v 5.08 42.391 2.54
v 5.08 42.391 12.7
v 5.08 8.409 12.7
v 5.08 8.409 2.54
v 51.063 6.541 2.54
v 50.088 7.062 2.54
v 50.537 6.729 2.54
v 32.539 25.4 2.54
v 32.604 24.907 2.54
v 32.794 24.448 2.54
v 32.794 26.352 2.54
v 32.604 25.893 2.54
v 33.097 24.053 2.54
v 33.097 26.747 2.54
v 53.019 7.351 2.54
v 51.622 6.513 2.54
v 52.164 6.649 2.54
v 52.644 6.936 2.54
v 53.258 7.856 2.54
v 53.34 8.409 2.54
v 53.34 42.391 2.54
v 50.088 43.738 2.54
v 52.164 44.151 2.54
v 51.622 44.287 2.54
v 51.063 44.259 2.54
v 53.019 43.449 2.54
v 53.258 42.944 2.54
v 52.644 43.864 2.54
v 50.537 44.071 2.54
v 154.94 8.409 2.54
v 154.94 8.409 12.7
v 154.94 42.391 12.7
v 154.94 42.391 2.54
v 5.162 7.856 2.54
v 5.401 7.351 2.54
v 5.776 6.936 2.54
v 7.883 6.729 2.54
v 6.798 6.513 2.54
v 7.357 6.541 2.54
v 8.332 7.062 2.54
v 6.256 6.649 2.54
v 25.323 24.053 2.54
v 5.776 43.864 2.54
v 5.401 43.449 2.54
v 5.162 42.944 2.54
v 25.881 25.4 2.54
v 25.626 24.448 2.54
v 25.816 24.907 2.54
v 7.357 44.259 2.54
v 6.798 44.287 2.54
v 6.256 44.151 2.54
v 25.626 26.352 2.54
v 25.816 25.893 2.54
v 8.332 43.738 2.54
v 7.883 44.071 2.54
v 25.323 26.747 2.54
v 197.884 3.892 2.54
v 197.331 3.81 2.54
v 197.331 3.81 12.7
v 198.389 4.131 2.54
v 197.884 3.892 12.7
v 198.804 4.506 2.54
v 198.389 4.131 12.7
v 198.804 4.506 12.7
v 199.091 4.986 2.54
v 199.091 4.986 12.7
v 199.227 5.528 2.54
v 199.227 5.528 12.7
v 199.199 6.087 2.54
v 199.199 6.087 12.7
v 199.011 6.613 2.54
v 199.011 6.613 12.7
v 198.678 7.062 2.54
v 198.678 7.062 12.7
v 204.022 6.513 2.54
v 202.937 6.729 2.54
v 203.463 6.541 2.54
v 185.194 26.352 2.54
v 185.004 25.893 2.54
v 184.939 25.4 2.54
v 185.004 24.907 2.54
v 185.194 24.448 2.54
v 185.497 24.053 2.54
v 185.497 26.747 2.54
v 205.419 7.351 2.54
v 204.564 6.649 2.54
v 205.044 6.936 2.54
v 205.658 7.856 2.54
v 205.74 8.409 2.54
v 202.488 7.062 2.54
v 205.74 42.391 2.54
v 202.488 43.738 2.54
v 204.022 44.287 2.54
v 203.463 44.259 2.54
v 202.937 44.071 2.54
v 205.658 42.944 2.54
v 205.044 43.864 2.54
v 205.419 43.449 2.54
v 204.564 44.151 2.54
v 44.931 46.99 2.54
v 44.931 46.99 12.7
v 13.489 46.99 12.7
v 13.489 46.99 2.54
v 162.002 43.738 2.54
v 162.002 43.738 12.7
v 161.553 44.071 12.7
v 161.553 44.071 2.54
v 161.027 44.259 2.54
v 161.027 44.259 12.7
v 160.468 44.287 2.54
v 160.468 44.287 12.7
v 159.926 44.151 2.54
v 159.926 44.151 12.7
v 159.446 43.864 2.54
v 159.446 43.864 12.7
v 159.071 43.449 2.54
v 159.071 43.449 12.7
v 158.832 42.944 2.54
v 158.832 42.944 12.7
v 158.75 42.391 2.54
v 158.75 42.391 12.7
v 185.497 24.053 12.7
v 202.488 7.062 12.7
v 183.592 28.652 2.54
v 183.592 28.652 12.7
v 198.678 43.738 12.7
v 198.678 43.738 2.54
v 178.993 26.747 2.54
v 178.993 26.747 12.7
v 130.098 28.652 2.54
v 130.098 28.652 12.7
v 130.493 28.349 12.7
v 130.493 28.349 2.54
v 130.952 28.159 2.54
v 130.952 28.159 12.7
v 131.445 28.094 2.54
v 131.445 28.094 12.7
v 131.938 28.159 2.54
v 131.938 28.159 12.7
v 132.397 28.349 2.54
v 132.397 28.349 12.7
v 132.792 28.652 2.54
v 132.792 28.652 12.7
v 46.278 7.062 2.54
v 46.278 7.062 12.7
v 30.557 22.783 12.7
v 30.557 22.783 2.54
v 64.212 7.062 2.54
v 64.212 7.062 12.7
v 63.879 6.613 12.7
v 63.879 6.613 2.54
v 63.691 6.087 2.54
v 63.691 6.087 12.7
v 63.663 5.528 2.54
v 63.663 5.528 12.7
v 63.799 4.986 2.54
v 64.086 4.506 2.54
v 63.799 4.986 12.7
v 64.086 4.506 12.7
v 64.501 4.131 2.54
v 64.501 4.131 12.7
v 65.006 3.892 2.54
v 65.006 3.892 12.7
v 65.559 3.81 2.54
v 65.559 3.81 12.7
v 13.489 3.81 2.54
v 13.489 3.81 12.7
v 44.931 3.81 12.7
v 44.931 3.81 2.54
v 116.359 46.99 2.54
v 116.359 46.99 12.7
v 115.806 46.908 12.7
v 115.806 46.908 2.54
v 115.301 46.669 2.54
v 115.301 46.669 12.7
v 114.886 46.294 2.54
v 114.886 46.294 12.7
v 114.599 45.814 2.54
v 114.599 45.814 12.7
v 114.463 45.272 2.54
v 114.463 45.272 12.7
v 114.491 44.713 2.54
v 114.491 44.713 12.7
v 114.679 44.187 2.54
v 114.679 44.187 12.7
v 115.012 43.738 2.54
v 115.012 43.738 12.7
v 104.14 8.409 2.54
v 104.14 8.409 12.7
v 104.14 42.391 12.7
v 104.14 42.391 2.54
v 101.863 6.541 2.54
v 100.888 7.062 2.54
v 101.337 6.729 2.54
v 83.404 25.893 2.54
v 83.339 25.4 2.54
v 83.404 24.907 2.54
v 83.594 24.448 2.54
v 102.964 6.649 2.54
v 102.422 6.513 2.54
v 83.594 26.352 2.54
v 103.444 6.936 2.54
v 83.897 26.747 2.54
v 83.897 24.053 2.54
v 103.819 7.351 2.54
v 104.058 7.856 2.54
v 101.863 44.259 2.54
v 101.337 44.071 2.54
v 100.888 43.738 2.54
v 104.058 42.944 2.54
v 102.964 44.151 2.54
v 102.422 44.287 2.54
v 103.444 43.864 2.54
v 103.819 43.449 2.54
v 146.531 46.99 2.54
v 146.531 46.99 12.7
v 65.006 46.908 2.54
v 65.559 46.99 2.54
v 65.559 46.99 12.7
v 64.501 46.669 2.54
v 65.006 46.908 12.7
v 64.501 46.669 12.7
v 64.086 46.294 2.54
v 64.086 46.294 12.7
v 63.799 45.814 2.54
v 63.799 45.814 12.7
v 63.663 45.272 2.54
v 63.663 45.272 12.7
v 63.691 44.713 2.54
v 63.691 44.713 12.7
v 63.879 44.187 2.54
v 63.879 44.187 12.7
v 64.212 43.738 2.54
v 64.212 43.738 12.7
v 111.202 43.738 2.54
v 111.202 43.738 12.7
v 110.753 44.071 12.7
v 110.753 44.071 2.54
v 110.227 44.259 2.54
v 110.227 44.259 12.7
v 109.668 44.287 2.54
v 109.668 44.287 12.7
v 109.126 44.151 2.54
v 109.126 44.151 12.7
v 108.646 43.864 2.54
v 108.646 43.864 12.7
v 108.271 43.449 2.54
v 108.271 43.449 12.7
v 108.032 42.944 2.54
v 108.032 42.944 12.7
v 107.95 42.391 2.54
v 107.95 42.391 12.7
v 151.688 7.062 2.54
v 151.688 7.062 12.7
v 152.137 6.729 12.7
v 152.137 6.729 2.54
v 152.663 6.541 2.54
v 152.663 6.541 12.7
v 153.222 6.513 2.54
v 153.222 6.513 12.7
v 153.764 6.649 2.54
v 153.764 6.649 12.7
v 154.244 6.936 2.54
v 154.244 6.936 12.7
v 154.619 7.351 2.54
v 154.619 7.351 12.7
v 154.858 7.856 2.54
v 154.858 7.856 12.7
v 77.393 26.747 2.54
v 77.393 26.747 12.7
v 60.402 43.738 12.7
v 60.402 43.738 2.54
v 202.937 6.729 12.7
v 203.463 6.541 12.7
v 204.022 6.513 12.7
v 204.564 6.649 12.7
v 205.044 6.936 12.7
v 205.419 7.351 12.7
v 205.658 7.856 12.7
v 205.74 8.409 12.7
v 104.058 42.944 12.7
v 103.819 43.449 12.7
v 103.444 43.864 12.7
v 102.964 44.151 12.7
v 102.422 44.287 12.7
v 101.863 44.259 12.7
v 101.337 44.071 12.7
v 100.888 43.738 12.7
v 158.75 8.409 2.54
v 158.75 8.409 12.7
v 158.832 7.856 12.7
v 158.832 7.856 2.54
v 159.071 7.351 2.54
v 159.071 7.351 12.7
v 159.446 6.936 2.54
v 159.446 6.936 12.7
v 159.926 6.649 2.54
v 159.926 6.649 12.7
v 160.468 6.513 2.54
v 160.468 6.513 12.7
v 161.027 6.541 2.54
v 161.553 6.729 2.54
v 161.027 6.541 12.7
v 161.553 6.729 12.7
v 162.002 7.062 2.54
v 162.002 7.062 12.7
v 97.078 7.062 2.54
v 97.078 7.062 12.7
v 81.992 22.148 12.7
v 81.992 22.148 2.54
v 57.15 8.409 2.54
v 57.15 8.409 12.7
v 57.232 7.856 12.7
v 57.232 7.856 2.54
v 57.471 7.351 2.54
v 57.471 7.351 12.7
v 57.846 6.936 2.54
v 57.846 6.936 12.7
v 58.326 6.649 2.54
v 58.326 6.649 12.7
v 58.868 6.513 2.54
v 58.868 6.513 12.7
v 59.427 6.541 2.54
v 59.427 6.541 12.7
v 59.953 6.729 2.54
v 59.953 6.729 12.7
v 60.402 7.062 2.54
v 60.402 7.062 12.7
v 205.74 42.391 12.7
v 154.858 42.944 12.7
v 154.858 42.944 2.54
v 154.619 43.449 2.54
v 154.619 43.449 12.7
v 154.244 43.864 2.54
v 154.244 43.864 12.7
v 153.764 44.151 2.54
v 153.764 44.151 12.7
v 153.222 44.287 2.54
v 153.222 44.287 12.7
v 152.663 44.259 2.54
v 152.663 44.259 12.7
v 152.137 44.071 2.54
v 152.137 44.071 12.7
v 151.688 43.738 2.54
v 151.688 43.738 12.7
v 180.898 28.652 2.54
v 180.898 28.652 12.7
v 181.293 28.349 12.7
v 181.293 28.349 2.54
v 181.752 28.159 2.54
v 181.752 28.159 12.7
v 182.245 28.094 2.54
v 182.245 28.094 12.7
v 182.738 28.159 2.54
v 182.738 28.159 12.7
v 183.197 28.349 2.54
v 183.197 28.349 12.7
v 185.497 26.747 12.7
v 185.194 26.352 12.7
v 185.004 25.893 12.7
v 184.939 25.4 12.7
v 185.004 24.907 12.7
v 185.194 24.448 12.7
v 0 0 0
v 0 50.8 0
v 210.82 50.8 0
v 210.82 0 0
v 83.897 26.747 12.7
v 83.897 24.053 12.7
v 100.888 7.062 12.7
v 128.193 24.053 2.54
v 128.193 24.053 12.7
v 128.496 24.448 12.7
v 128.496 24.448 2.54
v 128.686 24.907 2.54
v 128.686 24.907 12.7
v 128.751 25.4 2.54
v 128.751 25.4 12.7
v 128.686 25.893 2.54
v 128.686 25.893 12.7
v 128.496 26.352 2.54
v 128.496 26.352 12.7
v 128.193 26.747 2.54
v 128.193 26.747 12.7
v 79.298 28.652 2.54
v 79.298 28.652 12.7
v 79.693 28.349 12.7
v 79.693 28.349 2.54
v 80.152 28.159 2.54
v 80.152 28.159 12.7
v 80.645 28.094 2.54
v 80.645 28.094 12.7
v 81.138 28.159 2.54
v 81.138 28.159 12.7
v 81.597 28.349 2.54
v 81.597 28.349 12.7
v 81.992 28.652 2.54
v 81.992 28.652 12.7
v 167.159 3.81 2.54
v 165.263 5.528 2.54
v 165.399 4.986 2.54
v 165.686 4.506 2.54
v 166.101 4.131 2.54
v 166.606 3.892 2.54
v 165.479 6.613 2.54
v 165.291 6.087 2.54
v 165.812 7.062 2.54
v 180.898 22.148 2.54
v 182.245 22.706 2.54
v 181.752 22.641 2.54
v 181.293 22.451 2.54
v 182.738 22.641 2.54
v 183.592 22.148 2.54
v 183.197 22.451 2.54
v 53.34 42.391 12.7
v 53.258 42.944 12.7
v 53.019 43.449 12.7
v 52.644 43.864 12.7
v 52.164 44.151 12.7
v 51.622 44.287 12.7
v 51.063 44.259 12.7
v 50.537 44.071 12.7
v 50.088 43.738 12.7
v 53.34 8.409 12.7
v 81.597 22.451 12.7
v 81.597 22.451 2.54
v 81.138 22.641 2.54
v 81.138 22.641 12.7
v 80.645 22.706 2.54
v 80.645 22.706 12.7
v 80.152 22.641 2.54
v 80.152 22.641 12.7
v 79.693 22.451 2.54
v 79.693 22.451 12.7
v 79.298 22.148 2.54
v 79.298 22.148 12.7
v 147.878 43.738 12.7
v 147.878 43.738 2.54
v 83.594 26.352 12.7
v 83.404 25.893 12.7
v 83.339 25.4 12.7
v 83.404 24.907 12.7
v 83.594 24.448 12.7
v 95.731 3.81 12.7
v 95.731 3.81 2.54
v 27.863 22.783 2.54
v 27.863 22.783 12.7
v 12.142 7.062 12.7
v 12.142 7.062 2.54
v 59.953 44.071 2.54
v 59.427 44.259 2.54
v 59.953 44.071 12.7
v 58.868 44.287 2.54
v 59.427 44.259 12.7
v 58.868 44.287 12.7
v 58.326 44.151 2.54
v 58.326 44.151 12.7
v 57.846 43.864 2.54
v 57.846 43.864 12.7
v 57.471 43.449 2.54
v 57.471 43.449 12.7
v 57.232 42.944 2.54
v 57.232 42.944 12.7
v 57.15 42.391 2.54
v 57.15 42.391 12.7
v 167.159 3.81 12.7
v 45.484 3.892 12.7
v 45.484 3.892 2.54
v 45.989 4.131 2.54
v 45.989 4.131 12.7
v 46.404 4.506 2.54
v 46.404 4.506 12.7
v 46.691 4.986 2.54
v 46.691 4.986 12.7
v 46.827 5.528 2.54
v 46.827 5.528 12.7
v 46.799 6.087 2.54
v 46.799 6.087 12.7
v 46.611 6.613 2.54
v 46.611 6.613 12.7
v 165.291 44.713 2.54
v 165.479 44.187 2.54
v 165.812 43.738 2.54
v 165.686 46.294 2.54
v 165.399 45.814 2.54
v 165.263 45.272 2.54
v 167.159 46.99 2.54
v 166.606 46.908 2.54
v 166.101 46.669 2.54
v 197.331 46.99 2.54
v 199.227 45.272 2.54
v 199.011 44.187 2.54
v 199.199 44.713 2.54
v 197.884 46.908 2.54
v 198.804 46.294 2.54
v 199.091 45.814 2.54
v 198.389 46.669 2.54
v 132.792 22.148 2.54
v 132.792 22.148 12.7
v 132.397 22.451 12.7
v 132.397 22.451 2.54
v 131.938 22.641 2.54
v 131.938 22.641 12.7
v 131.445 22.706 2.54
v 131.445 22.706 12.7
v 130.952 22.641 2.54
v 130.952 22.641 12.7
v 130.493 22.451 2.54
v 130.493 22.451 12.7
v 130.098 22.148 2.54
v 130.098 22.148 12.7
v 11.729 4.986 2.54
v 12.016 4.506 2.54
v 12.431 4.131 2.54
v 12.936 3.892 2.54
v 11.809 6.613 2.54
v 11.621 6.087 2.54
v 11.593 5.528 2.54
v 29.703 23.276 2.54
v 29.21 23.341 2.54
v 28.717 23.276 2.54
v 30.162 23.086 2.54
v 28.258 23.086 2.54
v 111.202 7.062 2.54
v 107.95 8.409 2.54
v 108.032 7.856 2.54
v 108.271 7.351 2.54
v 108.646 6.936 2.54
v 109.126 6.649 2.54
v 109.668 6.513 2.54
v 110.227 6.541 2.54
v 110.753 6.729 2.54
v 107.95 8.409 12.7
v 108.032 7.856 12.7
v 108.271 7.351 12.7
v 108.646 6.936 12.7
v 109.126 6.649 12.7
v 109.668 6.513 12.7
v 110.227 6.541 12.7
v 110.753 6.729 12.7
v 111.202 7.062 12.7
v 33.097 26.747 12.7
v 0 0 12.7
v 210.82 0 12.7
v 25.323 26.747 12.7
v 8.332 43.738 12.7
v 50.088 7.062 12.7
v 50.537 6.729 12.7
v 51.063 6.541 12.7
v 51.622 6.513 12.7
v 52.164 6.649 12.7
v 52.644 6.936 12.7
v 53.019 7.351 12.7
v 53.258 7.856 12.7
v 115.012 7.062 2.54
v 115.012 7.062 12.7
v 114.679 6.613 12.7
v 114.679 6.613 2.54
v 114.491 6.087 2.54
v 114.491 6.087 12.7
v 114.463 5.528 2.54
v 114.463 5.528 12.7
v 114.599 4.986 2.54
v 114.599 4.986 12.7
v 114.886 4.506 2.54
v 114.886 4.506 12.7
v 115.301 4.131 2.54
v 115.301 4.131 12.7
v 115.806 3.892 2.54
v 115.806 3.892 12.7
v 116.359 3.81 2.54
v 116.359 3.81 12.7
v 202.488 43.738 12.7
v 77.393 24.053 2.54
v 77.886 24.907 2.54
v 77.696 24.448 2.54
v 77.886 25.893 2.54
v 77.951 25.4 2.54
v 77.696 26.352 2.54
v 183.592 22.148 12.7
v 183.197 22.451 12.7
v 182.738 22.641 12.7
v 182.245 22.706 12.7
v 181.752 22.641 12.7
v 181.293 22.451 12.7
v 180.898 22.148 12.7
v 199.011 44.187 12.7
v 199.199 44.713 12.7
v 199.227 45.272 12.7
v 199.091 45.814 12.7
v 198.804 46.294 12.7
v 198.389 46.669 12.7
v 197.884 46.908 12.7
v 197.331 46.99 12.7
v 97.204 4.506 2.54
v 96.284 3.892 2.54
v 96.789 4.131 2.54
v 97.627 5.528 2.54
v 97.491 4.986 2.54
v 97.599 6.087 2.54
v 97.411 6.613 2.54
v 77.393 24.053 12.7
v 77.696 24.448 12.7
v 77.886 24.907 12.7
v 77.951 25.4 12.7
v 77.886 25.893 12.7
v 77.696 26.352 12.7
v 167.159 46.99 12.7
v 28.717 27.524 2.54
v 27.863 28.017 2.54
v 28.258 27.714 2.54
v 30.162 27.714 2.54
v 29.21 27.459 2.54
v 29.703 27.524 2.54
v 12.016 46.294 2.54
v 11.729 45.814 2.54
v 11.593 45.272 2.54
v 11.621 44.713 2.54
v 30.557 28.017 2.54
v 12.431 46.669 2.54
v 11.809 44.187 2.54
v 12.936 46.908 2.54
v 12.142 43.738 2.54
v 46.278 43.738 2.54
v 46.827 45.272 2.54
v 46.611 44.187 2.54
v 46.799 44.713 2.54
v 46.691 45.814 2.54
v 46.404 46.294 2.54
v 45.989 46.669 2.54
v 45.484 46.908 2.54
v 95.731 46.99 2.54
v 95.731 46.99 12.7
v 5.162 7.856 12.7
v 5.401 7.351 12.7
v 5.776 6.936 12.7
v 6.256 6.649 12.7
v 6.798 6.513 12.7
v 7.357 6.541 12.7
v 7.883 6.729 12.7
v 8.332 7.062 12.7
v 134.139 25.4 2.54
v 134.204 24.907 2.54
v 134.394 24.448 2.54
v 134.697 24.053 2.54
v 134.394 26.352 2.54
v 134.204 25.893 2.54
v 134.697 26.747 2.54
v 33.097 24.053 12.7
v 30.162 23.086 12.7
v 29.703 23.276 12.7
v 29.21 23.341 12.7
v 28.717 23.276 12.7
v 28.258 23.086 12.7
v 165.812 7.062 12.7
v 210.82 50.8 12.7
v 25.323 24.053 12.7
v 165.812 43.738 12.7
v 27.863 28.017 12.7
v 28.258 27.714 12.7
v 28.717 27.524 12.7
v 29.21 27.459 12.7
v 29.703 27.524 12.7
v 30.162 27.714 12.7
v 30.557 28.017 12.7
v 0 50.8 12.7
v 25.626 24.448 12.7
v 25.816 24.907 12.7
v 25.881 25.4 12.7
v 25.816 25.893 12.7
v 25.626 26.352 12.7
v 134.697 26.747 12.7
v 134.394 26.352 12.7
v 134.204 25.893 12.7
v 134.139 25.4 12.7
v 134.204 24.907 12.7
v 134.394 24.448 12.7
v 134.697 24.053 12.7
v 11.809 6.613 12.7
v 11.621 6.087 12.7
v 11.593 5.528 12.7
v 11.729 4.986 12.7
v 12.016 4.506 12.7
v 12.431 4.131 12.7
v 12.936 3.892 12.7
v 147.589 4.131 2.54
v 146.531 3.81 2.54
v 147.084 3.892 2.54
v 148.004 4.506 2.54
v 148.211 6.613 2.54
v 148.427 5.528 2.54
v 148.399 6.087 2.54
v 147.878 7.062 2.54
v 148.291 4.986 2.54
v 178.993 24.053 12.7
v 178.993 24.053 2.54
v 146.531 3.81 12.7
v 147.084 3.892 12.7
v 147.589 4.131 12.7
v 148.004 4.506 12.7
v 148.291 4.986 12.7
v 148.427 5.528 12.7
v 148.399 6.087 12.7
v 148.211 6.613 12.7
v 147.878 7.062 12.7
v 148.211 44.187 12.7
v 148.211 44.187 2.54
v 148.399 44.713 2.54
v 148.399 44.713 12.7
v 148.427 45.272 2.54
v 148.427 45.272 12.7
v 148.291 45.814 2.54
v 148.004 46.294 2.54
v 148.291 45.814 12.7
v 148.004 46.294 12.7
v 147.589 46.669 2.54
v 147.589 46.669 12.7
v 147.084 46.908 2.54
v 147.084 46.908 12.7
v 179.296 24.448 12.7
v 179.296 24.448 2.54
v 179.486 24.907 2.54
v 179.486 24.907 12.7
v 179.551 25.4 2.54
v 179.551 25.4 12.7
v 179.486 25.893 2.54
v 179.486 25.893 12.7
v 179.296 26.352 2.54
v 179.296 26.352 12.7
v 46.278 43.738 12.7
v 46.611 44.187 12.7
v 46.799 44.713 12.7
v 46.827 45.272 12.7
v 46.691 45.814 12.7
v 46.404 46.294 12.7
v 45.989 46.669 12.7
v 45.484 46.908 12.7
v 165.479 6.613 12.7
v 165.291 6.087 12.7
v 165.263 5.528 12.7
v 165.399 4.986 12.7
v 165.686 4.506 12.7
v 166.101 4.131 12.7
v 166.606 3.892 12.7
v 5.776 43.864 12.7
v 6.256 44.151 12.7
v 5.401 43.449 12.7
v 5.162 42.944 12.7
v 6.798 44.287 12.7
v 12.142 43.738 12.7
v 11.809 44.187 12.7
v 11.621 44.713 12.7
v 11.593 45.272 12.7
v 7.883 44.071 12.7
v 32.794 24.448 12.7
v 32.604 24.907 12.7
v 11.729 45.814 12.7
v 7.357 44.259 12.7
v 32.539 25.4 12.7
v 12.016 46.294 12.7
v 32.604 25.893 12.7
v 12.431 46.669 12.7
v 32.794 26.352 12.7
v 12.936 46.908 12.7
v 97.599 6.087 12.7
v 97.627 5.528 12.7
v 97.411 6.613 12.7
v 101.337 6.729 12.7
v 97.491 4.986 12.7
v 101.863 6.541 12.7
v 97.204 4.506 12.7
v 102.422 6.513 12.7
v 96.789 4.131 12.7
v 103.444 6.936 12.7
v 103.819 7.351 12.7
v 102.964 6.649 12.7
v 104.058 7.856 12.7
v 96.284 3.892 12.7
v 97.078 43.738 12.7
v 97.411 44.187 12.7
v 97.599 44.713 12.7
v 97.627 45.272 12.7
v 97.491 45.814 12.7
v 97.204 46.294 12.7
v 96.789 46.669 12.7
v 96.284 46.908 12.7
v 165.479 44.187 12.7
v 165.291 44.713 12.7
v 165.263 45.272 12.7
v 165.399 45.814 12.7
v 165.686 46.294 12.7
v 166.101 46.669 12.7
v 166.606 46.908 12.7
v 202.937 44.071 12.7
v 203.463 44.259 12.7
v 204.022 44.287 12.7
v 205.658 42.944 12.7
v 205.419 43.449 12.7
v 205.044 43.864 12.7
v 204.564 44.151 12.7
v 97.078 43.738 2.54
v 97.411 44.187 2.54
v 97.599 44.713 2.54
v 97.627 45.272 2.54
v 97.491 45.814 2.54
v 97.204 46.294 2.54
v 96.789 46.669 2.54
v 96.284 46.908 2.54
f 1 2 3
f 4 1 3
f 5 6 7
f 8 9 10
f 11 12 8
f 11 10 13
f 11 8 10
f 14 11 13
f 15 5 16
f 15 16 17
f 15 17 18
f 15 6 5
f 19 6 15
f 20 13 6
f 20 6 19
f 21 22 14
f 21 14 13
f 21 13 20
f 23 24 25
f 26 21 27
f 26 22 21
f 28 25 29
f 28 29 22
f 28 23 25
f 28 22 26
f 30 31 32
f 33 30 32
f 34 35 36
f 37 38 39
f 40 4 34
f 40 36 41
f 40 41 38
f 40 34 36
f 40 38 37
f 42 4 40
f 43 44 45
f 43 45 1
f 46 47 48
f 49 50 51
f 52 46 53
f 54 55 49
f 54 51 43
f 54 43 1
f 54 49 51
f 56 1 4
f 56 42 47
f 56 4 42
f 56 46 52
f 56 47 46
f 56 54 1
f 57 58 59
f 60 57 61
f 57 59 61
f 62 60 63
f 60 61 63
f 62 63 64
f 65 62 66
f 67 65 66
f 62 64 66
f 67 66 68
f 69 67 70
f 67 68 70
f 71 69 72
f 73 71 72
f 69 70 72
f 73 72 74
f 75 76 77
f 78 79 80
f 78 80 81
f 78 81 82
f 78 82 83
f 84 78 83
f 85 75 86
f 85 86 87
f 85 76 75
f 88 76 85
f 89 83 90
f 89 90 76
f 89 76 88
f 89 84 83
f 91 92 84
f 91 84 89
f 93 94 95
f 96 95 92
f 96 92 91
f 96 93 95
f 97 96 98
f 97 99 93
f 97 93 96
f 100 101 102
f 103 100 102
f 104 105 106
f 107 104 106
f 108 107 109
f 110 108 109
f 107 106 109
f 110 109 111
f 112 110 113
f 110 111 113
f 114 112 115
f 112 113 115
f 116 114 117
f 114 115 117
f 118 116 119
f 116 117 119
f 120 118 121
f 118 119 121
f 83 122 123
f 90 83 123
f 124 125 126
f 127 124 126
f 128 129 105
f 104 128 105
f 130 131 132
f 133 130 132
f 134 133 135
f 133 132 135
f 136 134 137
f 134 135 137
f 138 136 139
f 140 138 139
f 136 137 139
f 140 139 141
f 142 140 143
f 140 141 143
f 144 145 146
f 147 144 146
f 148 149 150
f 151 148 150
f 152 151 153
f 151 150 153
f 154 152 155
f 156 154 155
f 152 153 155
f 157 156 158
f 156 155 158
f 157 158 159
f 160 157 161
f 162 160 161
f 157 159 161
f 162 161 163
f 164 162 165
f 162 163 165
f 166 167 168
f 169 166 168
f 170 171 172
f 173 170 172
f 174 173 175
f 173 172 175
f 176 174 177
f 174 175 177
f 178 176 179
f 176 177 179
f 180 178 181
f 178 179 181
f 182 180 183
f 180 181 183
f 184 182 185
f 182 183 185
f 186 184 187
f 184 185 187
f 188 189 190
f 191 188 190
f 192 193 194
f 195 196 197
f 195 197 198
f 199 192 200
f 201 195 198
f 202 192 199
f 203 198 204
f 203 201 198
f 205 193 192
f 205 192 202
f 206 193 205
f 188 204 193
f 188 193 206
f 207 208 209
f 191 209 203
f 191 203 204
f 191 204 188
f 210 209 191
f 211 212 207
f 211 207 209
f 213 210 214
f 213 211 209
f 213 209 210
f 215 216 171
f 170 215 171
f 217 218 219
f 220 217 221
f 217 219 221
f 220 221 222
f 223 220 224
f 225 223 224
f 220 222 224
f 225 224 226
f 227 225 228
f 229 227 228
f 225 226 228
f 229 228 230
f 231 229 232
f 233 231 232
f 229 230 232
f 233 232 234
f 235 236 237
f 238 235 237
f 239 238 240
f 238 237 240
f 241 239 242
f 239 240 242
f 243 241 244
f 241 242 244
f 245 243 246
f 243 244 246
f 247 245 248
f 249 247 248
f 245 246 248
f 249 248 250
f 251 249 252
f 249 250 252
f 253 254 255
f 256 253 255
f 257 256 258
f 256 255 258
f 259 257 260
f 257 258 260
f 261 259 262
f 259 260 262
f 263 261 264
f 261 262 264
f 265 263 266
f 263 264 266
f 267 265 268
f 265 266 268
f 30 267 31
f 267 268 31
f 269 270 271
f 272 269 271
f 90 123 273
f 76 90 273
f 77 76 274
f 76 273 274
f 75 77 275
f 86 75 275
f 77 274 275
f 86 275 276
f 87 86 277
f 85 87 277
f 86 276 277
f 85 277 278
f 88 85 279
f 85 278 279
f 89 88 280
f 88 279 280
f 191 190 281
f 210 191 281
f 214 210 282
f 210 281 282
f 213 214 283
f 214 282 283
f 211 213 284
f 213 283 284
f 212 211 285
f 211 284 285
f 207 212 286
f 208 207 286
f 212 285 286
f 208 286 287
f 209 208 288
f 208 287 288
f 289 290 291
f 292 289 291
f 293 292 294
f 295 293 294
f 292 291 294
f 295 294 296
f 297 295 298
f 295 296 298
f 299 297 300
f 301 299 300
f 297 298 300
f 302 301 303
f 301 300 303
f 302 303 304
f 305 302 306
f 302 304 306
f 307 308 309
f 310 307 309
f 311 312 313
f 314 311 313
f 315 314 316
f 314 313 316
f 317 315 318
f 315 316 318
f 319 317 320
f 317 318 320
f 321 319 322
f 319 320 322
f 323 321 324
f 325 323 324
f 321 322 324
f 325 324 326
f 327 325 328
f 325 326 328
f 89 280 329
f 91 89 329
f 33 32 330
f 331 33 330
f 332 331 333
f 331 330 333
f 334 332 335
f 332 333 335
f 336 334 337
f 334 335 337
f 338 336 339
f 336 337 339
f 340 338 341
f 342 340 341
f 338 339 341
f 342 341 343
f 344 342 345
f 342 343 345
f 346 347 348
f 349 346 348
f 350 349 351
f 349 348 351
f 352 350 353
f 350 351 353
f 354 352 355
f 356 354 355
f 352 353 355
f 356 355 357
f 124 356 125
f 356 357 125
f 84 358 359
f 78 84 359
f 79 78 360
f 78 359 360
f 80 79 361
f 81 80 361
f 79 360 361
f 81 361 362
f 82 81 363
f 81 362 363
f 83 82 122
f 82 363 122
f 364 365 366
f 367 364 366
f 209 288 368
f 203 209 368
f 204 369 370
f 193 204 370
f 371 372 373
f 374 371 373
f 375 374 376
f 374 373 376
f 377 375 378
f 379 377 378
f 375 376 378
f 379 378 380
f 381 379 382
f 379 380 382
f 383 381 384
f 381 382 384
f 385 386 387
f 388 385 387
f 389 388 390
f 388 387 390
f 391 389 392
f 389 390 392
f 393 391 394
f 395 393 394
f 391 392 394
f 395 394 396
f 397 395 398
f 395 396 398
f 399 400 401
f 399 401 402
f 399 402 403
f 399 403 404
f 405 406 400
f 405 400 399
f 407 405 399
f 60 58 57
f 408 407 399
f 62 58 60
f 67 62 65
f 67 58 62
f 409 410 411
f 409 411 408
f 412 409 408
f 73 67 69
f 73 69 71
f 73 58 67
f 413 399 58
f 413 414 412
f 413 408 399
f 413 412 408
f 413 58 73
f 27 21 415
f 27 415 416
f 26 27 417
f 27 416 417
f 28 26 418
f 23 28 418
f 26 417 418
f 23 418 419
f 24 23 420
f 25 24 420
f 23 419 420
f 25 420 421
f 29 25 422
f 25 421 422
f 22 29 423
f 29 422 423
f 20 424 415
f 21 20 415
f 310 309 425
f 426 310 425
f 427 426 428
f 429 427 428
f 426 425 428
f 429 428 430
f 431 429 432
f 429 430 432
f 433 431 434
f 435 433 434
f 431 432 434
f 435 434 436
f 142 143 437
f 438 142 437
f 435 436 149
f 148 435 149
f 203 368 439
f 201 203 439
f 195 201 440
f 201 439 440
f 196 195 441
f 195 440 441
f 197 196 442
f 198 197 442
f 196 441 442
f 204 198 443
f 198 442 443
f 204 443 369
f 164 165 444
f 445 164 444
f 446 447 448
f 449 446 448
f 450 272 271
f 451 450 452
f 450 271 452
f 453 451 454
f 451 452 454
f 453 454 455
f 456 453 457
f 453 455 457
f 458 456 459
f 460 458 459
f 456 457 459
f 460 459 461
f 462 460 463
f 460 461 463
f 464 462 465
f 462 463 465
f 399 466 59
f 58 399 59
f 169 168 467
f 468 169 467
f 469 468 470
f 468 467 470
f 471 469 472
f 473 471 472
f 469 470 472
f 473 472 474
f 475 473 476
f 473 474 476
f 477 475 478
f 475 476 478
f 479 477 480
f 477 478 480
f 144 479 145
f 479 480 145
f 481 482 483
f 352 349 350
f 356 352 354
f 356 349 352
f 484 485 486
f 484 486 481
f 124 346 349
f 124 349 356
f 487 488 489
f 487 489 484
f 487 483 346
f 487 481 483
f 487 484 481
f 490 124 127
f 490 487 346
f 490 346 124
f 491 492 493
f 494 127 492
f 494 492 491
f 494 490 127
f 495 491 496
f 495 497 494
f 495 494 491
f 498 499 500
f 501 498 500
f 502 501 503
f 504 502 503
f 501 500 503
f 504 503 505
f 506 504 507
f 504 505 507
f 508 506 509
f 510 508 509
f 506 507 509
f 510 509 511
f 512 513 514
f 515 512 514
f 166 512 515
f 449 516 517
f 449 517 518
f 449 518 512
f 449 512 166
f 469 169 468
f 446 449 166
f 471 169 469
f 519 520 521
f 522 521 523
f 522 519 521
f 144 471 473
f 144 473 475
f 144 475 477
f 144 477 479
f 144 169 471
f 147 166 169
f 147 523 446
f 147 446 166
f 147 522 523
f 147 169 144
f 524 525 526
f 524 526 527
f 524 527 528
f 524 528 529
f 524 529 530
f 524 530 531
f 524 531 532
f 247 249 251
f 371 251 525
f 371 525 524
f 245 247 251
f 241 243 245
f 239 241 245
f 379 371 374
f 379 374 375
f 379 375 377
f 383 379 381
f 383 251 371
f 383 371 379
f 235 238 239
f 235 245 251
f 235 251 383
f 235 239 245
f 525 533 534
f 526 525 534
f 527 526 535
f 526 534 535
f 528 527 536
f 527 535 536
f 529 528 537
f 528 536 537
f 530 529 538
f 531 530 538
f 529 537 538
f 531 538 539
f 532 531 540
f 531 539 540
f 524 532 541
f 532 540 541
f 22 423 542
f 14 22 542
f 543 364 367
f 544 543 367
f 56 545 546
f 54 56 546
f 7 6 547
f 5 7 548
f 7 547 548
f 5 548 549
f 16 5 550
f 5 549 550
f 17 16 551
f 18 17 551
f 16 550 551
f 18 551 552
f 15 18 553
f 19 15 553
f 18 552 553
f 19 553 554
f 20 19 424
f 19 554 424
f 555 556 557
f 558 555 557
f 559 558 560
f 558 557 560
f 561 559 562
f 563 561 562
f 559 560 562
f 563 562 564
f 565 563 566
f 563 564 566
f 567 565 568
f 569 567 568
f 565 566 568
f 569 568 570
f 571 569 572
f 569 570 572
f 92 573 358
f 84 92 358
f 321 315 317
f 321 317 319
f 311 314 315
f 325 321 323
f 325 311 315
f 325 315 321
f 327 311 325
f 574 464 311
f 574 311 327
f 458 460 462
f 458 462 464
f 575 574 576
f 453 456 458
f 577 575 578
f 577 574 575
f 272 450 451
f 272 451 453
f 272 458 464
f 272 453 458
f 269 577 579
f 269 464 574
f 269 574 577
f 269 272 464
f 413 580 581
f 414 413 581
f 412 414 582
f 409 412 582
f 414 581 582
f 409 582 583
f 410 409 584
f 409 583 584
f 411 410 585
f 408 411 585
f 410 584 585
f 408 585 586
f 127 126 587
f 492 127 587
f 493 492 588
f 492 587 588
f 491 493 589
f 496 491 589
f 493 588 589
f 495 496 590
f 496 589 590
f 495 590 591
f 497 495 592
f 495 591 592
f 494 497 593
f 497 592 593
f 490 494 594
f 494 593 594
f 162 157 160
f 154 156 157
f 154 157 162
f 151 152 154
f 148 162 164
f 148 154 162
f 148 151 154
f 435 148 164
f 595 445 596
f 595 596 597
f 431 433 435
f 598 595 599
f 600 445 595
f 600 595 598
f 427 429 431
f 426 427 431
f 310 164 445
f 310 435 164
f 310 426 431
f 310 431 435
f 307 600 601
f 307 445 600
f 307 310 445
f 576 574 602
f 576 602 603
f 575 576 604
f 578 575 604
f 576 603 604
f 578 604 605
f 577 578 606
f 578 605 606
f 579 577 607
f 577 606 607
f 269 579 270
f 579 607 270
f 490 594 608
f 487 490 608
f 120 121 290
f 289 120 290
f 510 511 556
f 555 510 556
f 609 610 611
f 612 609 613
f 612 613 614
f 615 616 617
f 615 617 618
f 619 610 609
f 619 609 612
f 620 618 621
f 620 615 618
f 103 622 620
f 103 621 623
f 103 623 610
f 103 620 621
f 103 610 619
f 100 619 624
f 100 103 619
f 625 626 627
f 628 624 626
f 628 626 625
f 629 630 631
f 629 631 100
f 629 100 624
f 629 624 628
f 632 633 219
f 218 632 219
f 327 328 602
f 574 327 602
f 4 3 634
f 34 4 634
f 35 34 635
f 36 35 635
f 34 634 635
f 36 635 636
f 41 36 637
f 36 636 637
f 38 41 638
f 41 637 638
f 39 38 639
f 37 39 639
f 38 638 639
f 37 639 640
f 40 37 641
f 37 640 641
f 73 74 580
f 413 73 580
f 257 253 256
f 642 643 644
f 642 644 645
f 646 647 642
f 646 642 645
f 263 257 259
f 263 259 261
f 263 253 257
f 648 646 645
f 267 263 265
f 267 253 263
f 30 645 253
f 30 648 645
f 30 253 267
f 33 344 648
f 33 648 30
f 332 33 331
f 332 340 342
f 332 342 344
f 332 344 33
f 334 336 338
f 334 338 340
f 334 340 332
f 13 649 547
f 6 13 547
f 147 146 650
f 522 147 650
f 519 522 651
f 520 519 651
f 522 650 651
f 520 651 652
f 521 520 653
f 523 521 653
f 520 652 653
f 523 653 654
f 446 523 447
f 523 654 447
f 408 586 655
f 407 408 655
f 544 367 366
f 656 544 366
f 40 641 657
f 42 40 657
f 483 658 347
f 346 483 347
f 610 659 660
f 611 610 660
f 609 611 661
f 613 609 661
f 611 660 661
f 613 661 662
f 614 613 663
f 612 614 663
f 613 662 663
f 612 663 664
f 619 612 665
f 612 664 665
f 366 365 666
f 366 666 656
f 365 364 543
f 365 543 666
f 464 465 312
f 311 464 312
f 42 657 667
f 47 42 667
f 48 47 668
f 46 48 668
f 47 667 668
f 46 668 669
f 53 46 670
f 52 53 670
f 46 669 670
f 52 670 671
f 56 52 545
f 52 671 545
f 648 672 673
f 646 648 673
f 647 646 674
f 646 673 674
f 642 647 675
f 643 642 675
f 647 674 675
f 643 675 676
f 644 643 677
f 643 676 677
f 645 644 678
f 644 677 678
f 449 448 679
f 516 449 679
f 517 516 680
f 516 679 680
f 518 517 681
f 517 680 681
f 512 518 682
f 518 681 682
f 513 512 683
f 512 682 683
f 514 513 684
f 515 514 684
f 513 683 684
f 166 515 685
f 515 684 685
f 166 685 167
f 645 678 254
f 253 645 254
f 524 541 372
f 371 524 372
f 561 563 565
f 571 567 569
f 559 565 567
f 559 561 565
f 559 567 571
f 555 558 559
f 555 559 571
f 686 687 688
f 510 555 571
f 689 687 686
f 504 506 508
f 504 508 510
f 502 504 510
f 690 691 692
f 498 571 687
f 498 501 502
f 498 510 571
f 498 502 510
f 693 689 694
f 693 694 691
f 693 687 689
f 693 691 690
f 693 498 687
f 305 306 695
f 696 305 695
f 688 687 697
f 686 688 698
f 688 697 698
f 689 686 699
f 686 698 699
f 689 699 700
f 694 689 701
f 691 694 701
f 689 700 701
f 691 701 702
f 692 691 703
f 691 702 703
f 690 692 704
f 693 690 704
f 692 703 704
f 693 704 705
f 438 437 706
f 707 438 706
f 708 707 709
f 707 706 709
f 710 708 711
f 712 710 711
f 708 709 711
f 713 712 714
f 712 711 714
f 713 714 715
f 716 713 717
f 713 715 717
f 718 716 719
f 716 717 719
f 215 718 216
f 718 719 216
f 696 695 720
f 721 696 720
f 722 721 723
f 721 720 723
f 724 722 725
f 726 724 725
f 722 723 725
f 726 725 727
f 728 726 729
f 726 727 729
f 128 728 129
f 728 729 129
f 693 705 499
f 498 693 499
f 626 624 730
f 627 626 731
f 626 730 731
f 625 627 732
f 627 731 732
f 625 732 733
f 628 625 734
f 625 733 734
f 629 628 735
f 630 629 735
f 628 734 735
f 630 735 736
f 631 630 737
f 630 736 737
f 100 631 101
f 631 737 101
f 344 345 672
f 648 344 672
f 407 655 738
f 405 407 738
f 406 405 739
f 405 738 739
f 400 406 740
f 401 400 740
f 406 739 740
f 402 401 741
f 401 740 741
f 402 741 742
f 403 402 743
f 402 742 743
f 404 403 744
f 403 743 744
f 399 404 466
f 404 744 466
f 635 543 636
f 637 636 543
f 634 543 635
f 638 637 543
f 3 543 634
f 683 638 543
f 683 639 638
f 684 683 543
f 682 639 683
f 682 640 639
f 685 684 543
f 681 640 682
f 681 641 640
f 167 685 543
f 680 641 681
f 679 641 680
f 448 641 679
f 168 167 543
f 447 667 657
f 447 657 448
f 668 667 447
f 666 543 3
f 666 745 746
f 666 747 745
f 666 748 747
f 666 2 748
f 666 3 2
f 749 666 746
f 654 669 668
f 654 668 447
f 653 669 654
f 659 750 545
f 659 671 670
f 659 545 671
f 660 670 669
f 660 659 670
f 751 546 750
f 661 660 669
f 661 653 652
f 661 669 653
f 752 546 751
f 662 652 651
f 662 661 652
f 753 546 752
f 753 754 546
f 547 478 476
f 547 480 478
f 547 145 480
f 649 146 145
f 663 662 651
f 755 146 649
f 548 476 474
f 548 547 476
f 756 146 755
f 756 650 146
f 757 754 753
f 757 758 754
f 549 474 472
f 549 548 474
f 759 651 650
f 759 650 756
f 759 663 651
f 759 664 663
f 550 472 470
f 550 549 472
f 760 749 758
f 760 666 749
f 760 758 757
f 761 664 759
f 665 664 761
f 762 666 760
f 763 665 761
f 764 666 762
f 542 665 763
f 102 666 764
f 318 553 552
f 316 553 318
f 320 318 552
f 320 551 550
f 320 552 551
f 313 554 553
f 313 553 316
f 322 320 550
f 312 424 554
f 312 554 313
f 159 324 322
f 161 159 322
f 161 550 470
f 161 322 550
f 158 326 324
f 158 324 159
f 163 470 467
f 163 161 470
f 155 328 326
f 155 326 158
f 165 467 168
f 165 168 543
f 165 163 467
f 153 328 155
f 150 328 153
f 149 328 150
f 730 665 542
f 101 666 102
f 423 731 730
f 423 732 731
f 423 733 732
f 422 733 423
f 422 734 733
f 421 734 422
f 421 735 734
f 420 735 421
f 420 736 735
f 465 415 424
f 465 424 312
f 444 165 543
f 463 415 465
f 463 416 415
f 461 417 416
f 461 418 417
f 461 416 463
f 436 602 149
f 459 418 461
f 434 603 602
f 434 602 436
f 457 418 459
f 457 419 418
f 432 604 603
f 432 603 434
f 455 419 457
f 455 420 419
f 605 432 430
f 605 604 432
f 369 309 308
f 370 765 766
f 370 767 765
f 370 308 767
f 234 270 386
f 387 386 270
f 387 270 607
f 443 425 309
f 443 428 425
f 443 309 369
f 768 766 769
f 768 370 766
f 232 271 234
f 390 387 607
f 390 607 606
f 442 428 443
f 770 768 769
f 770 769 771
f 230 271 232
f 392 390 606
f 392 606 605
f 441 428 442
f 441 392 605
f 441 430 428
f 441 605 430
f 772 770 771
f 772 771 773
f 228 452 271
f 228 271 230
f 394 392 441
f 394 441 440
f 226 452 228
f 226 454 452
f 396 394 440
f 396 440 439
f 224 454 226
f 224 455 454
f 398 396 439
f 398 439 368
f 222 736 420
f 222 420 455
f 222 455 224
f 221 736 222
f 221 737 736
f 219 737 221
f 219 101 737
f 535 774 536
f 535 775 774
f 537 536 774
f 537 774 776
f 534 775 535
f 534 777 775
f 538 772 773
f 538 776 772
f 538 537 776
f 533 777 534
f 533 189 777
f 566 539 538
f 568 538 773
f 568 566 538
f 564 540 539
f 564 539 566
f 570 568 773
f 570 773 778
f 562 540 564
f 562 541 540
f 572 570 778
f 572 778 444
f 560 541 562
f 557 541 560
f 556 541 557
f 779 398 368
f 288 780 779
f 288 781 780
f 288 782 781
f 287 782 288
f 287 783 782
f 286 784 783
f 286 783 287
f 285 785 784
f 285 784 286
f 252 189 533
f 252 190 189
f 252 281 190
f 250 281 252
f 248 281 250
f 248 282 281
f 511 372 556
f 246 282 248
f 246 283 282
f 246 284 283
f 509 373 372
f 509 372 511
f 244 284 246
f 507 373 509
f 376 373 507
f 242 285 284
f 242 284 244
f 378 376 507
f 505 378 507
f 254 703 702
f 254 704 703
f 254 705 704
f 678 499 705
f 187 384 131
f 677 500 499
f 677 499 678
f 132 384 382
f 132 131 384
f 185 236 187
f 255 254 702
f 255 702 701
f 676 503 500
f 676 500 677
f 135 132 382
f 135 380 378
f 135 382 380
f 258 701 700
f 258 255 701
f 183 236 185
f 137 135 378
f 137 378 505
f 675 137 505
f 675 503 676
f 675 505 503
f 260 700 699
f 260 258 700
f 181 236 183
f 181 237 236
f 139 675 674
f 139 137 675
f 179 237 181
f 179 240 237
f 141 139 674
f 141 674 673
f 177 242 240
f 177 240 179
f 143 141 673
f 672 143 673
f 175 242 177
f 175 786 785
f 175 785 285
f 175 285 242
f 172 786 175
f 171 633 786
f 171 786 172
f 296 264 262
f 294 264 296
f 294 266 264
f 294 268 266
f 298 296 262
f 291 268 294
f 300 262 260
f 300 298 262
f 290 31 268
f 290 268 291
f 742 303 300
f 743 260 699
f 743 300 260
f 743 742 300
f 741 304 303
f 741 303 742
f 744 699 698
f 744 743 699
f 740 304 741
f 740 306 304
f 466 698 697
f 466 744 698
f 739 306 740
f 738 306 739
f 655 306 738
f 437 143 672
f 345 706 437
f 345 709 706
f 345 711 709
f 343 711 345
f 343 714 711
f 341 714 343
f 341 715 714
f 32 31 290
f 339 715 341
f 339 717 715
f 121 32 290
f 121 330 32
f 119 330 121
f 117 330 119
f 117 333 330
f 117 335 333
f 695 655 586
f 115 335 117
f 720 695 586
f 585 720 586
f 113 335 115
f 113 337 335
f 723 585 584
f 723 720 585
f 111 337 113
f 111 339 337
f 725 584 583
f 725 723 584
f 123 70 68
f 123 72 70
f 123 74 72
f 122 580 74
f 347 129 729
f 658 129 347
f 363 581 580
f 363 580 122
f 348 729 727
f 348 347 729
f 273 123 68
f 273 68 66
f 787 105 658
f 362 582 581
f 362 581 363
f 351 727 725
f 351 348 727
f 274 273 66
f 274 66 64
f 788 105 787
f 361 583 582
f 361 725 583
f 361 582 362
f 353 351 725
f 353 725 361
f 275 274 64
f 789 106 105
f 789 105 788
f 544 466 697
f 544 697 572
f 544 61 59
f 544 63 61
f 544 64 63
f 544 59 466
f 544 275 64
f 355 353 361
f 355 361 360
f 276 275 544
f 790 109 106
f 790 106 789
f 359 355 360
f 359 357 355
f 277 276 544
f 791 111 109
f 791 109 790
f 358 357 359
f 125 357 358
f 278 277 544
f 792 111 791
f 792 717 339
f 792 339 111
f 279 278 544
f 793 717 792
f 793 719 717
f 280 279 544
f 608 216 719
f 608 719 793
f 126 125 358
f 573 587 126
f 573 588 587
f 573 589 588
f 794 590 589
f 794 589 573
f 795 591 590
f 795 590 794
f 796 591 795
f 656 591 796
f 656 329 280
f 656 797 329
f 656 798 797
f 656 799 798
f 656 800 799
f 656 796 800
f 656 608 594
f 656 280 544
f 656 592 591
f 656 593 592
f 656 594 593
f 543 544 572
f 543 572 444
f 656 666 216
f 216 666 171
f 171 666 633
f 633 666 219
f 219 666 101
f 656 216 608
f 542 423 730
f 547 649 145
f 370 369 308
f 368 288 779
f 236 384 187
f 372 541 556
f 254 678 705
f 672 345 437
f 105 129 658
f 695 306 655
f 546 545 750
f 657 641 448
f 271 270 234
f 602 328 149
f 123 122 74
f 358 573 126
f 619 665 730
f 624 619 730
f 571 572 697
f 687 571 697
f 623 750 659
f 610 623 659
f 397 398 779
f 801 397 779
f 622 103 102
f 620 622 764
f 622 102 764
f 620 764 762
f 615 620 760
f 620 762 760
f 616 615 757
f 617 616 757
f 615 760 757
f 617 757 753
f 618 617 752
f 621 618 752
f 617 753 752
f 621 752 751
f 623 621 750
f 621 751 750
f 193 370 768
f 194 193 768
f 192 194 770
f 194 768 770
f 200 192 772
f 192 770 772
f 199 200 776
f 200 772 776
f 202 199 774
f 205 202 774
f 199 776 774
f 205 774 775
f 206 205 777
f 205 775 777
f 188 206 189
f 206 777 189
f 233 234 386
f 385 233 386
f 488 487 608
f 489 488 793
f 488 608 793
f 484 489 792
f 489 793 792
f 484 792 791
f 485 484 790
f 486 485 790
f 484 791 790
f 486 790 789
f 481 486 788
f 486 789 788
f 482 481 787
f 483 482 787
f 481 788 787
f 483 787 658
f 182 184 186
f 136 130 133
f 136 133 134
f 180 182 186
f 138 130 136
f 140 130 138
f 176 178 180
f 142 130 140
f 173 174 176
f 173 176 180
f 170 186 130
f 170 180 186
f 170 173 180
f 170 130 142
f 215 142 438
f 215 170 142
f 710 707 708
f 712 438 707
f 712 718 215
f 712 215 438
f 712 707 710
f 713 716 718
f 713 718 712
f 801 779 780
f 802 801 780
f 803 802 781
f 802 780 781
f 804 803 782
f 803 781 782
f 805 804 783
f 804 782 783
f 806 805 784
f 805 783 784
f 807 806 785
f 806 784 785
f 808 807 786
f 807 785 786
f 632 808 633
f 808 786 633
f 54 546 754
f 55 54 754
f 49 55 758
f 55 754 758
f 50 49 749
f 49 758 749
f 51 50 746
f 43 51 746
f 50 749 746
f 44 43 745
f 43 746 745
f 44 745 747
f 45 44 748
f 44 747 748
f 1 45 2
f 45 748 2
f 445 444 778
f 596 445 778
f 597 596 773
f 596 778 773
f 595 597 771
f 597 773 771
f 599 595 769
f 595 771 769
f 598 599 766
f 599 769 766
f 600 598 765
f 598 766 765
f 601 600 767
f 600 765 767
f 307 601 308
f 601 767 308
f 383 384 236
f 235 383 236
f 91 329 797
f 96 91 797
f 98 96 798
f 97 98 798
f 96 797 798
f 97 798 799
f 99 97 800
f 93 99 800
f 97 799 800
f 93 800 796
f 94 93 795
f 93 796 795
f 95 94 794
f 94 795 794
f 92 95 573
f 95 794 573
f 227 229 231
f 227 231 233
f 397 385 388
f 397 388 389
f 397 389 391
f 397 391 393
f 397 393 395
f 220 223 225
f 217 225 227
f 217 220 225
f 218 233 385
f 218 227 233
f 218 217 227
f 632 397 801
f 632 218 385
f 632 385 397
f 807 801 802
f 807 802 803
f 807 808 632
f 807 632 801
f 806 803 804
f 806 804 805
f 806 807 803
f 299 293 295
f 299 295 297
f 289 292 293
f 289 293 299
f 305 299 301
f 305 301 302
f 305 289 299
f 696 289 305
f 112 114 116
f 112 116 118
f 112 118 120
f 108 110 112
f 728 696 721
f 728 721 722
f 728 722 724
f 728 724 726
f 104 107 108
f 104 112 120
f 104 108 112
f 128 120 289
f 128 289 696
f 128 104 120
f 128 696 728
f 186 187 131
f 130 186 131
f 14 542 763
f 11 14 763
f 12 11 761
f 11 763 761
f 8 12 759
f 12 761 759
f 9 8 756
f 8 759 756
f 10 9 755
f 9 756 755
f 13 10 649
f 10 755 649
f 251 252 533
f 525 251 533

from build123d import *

# Parameters (mm, degrees)
F0_W     = 210.82
F0_H     = 50.8
F1_DEPTH = 12.7
F3_DEPTH = 10.16


with BuildPart() as f1:
    # F0 (on Top) → F1 (new body)
    with BuildSketch(Plane.XY):
        with Locations((105.41, 25.4)):
            Rectangle(F0_W, F0_H)
    extrude(amount=F1_DEPTH)

    # F2 (on face) → F3 (cut)
    with BuildSketch(Plane.XY.offset(12.7)):
        with BuildLine():
            ThreePointArc((8.332038, 43.737962), (6.255988, 44.150914), (5.08, 42.390923))
            Line((5.08, 42.390923), (5.08, 8.409077))
            ThreePointArc((5.08, 8.409077), (6.255988, 6.649086), (8.332038, 7.062038))
            Line((8.332038, 7.062038), (25.322962, 24.052962))
            ThreePointArc((25.322962, 24.052962), (25.880923, 25.4), (25.322962, 26.747038))
            Line((25.322962, 26.747038), (8.332038, 43.737962))
        make_face()
        with BuildLine():
            Line((50.087962, 43.737962), (33.097038, 26.747038))
            ThreePointArc((33.097038, 26.747038), (32.539077, 25.4), (33.097038, 24.052962))
            Line((33.097038, 24.052962), (50.087962, 7.062038))
            ThreePointArc((50.087962, 7.062038), (52.164012, 6.649086), (53.34, 8.409077))
            Line((53.34, 8.409077), (53.34, 42.390923))
            ThreePointArc((53.34, 42.390923), (52.164012, 44.150914), (50.087962, 43.737962))
        make_face()
        with BuildLine():
            ThreePointArc((60.402038, 43.737962), (58.325988, 44.150914), (57.15, 42.390923))
            Line((57.15, 42.390923), (57.15, 8.409077))
            ThreePointArc((57.15, 8.409077), (58.325988, 6.649086), (60.402038, 7.062038))
            Line((60.402038, 7.062038), (77.392962, 24.052962))
            ThreePointArc((77.392962, 24.052962), (77.950923, 25.4), (77.392962, 26.747038))
            Line((77.392962, 26.747038), (60.402038, 43.737962))
        make_face()
        with BuildLine():
            Line((104.14, 8.409077), (104.14, 42.390923))
            ThreePointArc((104.14, 42.390923), (102.964012, 44.150914), (100.887962, 43.737962))
            Line((100.887962, 43.737962), (83.897038, 26.747038))
            ThreePointArc((83.897038, 26.747038), (83.339077, 25.4), (83.897038, 24.052962))
            Line((83.897038, 24.052962), (100.887962, 7.062038))
            ThreePointArc((100.887962, 7.062038), (102.964012, 6.649086), (104.14, 8.409077))
        make_face()
        with BuildLine():
            ThreePointArc((111.202038, 43.737962), (109.125988, 44.150914), (107.95, 42.390923))
            Line((107.95, 42.390923), (107.95, 8.409077))
            ThreePointArc((107.95, 8.409077), (109.125988, 6.649086), (111.202038, 7.062038))
            Line((111.202038, 7.062038), (128.192962, 24.052962))
            ThreePointArc((128.192962, 24.052962), (128.750923, 25.4), (128.192962, 26.747038))
            Line((128.192962, 26.747038), (111.202038, 43.737962))
        make_face()
        with BuildLine():
            Line((154.94, 8.409077), (154.94, 42.390923))
            ThreePointArc((154.94, 42.390923), (153.764012, 44.150914), (151.687962, 43.737962))
            Line((151.687962, 43.737962), (134.697038, 26.747038))
            ThreePointArc((134.697038, 26.747038), (134.139077, 25.4), (134.697038, 24.052962))
            Line((134.697038, 24.052962), (151.687962, 7.062038))
            ThreePointArc((151.687962, 7.062038), (153.764012, 6.649086), (154.94, 8.409077))
        make_face()
        with BuildLine():
            ThreePointArc((162.002038, 43.737962), (159.925988, 44.150914), (158.75, 42.390923))
            Line((158.75, 42.390923), (158.75, 8.409077))
            ThreePointArc((158.75, 8.409077), (159.925988, 6.649086), (162.002038, 7.062038))
            Line((162.002038, 7.062038), (178.992962, 24.052962))
            ThreePointArc((178.992962, 24.052962), (179.550923, 25.4), (178.992962, 26.747038))
            Line((178.992962, 26.747038), (162.002038, 43.737962))
        make_face()
        with BuildLine():
            Line((205.74, 8.409077), (205.74, 42.390923))
            ThreePointArc((205.74, 42.390923), (204.564012, 44.150914), (202.487962, 43.737962))
            Line((202.487962, 43.737962), (185.497038, 26.747038))
            ThreePointArc((185.497038, 26.747038), (184.939077, 25.4), (185.497038, 24.052962))
            Line((185.497038, 24.052962), (202.487962, 7.062038))
            ThreePointArc((202.487962, 7.062038), (204.564012, 6.649086), (205.74, 8.409077))
        make_face()
        with BuildLine():
            Line((44.930923, 46.99), (13.489077, 46.99))
            ThreePointArc((13.489077, 46.99), (11.729086, 45.814012), (12.142038, 43.737962))
            Line((12.142038, 43.737962), (27.862962, 28.017038))
            ThreePointArc((27.862962, 28.017038), (29.21, 27.459077), (30.557038, 28.017038))
            Line((30.557038, 28.017038), (46.277962, 43.737962))
            ThreePointArc((46.277962, 43.737962), (46.690914, 45.814012), (44.930923, 46.99))
        make_face()
        with BuildLine():
            ThreePointArc((12.142038, 7.062038), (11.729086, 4.985988), (13.489077, 3.81))
            Line((13.489077, 3.81), (44.930923, 3.81))
            ThreePointArc((44.930923, 3.81), (46.690914, 4.985988), (46.277962, 7.062038))
            Line((46.277962, 7.062038), (30.557038, 22.782962))
            ThreePointArc((30.557038, 22.782962), (29.21, 23.340923), (27.862962, 22.782962))
            Line((27.862962, 22.782962), (12.142038, 7.062038))
        make_face()
        with BuildLine():
            Line((95.730923, 46.99), (65.559077, 46.99))
            ThreePointArc((65.559077, 46.99), (63.799086, 45.814012), (64.212038, 43.737962))
            Line((64.212038, 43.737962), (79.297962, 28.652038))
            ThreePointArc((79.297962, 28.652038), (80.645, 28.094077), (81.992038, 28.652038))
            Line((81.992038, 28.652038), (97.077962, 43.737962))
            ThreePointArc((97.077962, 43.737962), (97.490914, 45.814012), (95.730923, 46.99))
        make_face()
        with BuildLine():
            ThreePointArc((64.212038, 7.062038), (63.799086, 4.985988), (65.559077, 3.81))
            Line((65.559077, 3.81), (95.730923, 3.81))
            ThreePointArc((95.730923, 3.81), (97.490914, 4.985988), (97.077962, 7.062038))
            Line((97.077962, 7.062038), (81.992038, 22.147962))
            ThreePointArc((81.992038, 22.147962), (80.645, 22.705923), (79.297962, 22.147962))
            Line((79.297962, 22.147962), (64.212038, 7.062038))
        make_face()
        with BuildLine():
            Line((146.530923, 46.99), (116.359077, 46.99))
            ThreePointArc((116.359077, 46.99), (114.599086, 45.814012), (115.012038, 43.737962))
            Line((115.012038, 43.737962), (130.097962, 28.652038))
            ThreePointArc((130.097962, 28.652038), (131.445, 28.094077), (132.792038, 28.652038))
            Line((132.792038, 28.652038), (147.877962, 43.737962))
            ThreePointArc((147.877962, 43.737962), (148.290914, 45.814012), (146.530923, 46.99))
        make_face()
        with BuildLine():
            ThreePointArc((115.012038, 7.062038), (114.599086, 4.985988), (116.359077, 3.81))
            Line((116.359077, 3.81), (146.530923, 3.81))
            ThreePointArc((146.530923, 3.81), (148.290914, 4.985988), (147.877962, 7.062038))
            Line((147.877962, 7.062038), (132.792038, 22.147962))
            ThreePointArc((132.792038, 22.147962), (131.445, 22.705923), (130.097962, 22.147962))
            Line((130.097962, 22.147962), (115.012038, 7.062038))
        make_face()
        with BuildLine():
            Line((197.330923, 46.99), (167.159077, 46.99))
            ThreePointArc((167.159077, 46.99), (165.399086, 45.814012), (165.812038, 43.737962))
            Line((165.812038, 43.737962), (180.897962, 28.652038))
            ThreePointArc((180.897962, 28.652038), (182.245, 28.094077), (183.592038, 28.652038))
            Line((183.592038, 28.652038), (198.677962, 43.737962))
            ThreePointArc((198.677962, 43.737962), (199.090914, 45.814012), (197.330923, 46.99))
        make_face()
        with BuildLine():
            ThreePointArc((165.812038, 7.062038), (165.399086, 4.985988), (167.159077, 3.81))
            Line((167.159077, 3.81), (197.330923, 3.81))
            ThreePointArc((197.330923, 3.81), (199.090914, 4.985988), (198.677962, 7.062038))
            Line((198.677962, 7.062038), (183.592038, 22.147962))
            ThreePointArc((183.592038, 22.147962), (182.245, 22.705923), (180.897962, 22.147962))
            Line((180.897962, 22.147962), (165.812038, 7.062038))
        make_face()
    extrude(amount=-F3_DEPTH, mode=Mode.SUBTRACT)


solid = f1.part
